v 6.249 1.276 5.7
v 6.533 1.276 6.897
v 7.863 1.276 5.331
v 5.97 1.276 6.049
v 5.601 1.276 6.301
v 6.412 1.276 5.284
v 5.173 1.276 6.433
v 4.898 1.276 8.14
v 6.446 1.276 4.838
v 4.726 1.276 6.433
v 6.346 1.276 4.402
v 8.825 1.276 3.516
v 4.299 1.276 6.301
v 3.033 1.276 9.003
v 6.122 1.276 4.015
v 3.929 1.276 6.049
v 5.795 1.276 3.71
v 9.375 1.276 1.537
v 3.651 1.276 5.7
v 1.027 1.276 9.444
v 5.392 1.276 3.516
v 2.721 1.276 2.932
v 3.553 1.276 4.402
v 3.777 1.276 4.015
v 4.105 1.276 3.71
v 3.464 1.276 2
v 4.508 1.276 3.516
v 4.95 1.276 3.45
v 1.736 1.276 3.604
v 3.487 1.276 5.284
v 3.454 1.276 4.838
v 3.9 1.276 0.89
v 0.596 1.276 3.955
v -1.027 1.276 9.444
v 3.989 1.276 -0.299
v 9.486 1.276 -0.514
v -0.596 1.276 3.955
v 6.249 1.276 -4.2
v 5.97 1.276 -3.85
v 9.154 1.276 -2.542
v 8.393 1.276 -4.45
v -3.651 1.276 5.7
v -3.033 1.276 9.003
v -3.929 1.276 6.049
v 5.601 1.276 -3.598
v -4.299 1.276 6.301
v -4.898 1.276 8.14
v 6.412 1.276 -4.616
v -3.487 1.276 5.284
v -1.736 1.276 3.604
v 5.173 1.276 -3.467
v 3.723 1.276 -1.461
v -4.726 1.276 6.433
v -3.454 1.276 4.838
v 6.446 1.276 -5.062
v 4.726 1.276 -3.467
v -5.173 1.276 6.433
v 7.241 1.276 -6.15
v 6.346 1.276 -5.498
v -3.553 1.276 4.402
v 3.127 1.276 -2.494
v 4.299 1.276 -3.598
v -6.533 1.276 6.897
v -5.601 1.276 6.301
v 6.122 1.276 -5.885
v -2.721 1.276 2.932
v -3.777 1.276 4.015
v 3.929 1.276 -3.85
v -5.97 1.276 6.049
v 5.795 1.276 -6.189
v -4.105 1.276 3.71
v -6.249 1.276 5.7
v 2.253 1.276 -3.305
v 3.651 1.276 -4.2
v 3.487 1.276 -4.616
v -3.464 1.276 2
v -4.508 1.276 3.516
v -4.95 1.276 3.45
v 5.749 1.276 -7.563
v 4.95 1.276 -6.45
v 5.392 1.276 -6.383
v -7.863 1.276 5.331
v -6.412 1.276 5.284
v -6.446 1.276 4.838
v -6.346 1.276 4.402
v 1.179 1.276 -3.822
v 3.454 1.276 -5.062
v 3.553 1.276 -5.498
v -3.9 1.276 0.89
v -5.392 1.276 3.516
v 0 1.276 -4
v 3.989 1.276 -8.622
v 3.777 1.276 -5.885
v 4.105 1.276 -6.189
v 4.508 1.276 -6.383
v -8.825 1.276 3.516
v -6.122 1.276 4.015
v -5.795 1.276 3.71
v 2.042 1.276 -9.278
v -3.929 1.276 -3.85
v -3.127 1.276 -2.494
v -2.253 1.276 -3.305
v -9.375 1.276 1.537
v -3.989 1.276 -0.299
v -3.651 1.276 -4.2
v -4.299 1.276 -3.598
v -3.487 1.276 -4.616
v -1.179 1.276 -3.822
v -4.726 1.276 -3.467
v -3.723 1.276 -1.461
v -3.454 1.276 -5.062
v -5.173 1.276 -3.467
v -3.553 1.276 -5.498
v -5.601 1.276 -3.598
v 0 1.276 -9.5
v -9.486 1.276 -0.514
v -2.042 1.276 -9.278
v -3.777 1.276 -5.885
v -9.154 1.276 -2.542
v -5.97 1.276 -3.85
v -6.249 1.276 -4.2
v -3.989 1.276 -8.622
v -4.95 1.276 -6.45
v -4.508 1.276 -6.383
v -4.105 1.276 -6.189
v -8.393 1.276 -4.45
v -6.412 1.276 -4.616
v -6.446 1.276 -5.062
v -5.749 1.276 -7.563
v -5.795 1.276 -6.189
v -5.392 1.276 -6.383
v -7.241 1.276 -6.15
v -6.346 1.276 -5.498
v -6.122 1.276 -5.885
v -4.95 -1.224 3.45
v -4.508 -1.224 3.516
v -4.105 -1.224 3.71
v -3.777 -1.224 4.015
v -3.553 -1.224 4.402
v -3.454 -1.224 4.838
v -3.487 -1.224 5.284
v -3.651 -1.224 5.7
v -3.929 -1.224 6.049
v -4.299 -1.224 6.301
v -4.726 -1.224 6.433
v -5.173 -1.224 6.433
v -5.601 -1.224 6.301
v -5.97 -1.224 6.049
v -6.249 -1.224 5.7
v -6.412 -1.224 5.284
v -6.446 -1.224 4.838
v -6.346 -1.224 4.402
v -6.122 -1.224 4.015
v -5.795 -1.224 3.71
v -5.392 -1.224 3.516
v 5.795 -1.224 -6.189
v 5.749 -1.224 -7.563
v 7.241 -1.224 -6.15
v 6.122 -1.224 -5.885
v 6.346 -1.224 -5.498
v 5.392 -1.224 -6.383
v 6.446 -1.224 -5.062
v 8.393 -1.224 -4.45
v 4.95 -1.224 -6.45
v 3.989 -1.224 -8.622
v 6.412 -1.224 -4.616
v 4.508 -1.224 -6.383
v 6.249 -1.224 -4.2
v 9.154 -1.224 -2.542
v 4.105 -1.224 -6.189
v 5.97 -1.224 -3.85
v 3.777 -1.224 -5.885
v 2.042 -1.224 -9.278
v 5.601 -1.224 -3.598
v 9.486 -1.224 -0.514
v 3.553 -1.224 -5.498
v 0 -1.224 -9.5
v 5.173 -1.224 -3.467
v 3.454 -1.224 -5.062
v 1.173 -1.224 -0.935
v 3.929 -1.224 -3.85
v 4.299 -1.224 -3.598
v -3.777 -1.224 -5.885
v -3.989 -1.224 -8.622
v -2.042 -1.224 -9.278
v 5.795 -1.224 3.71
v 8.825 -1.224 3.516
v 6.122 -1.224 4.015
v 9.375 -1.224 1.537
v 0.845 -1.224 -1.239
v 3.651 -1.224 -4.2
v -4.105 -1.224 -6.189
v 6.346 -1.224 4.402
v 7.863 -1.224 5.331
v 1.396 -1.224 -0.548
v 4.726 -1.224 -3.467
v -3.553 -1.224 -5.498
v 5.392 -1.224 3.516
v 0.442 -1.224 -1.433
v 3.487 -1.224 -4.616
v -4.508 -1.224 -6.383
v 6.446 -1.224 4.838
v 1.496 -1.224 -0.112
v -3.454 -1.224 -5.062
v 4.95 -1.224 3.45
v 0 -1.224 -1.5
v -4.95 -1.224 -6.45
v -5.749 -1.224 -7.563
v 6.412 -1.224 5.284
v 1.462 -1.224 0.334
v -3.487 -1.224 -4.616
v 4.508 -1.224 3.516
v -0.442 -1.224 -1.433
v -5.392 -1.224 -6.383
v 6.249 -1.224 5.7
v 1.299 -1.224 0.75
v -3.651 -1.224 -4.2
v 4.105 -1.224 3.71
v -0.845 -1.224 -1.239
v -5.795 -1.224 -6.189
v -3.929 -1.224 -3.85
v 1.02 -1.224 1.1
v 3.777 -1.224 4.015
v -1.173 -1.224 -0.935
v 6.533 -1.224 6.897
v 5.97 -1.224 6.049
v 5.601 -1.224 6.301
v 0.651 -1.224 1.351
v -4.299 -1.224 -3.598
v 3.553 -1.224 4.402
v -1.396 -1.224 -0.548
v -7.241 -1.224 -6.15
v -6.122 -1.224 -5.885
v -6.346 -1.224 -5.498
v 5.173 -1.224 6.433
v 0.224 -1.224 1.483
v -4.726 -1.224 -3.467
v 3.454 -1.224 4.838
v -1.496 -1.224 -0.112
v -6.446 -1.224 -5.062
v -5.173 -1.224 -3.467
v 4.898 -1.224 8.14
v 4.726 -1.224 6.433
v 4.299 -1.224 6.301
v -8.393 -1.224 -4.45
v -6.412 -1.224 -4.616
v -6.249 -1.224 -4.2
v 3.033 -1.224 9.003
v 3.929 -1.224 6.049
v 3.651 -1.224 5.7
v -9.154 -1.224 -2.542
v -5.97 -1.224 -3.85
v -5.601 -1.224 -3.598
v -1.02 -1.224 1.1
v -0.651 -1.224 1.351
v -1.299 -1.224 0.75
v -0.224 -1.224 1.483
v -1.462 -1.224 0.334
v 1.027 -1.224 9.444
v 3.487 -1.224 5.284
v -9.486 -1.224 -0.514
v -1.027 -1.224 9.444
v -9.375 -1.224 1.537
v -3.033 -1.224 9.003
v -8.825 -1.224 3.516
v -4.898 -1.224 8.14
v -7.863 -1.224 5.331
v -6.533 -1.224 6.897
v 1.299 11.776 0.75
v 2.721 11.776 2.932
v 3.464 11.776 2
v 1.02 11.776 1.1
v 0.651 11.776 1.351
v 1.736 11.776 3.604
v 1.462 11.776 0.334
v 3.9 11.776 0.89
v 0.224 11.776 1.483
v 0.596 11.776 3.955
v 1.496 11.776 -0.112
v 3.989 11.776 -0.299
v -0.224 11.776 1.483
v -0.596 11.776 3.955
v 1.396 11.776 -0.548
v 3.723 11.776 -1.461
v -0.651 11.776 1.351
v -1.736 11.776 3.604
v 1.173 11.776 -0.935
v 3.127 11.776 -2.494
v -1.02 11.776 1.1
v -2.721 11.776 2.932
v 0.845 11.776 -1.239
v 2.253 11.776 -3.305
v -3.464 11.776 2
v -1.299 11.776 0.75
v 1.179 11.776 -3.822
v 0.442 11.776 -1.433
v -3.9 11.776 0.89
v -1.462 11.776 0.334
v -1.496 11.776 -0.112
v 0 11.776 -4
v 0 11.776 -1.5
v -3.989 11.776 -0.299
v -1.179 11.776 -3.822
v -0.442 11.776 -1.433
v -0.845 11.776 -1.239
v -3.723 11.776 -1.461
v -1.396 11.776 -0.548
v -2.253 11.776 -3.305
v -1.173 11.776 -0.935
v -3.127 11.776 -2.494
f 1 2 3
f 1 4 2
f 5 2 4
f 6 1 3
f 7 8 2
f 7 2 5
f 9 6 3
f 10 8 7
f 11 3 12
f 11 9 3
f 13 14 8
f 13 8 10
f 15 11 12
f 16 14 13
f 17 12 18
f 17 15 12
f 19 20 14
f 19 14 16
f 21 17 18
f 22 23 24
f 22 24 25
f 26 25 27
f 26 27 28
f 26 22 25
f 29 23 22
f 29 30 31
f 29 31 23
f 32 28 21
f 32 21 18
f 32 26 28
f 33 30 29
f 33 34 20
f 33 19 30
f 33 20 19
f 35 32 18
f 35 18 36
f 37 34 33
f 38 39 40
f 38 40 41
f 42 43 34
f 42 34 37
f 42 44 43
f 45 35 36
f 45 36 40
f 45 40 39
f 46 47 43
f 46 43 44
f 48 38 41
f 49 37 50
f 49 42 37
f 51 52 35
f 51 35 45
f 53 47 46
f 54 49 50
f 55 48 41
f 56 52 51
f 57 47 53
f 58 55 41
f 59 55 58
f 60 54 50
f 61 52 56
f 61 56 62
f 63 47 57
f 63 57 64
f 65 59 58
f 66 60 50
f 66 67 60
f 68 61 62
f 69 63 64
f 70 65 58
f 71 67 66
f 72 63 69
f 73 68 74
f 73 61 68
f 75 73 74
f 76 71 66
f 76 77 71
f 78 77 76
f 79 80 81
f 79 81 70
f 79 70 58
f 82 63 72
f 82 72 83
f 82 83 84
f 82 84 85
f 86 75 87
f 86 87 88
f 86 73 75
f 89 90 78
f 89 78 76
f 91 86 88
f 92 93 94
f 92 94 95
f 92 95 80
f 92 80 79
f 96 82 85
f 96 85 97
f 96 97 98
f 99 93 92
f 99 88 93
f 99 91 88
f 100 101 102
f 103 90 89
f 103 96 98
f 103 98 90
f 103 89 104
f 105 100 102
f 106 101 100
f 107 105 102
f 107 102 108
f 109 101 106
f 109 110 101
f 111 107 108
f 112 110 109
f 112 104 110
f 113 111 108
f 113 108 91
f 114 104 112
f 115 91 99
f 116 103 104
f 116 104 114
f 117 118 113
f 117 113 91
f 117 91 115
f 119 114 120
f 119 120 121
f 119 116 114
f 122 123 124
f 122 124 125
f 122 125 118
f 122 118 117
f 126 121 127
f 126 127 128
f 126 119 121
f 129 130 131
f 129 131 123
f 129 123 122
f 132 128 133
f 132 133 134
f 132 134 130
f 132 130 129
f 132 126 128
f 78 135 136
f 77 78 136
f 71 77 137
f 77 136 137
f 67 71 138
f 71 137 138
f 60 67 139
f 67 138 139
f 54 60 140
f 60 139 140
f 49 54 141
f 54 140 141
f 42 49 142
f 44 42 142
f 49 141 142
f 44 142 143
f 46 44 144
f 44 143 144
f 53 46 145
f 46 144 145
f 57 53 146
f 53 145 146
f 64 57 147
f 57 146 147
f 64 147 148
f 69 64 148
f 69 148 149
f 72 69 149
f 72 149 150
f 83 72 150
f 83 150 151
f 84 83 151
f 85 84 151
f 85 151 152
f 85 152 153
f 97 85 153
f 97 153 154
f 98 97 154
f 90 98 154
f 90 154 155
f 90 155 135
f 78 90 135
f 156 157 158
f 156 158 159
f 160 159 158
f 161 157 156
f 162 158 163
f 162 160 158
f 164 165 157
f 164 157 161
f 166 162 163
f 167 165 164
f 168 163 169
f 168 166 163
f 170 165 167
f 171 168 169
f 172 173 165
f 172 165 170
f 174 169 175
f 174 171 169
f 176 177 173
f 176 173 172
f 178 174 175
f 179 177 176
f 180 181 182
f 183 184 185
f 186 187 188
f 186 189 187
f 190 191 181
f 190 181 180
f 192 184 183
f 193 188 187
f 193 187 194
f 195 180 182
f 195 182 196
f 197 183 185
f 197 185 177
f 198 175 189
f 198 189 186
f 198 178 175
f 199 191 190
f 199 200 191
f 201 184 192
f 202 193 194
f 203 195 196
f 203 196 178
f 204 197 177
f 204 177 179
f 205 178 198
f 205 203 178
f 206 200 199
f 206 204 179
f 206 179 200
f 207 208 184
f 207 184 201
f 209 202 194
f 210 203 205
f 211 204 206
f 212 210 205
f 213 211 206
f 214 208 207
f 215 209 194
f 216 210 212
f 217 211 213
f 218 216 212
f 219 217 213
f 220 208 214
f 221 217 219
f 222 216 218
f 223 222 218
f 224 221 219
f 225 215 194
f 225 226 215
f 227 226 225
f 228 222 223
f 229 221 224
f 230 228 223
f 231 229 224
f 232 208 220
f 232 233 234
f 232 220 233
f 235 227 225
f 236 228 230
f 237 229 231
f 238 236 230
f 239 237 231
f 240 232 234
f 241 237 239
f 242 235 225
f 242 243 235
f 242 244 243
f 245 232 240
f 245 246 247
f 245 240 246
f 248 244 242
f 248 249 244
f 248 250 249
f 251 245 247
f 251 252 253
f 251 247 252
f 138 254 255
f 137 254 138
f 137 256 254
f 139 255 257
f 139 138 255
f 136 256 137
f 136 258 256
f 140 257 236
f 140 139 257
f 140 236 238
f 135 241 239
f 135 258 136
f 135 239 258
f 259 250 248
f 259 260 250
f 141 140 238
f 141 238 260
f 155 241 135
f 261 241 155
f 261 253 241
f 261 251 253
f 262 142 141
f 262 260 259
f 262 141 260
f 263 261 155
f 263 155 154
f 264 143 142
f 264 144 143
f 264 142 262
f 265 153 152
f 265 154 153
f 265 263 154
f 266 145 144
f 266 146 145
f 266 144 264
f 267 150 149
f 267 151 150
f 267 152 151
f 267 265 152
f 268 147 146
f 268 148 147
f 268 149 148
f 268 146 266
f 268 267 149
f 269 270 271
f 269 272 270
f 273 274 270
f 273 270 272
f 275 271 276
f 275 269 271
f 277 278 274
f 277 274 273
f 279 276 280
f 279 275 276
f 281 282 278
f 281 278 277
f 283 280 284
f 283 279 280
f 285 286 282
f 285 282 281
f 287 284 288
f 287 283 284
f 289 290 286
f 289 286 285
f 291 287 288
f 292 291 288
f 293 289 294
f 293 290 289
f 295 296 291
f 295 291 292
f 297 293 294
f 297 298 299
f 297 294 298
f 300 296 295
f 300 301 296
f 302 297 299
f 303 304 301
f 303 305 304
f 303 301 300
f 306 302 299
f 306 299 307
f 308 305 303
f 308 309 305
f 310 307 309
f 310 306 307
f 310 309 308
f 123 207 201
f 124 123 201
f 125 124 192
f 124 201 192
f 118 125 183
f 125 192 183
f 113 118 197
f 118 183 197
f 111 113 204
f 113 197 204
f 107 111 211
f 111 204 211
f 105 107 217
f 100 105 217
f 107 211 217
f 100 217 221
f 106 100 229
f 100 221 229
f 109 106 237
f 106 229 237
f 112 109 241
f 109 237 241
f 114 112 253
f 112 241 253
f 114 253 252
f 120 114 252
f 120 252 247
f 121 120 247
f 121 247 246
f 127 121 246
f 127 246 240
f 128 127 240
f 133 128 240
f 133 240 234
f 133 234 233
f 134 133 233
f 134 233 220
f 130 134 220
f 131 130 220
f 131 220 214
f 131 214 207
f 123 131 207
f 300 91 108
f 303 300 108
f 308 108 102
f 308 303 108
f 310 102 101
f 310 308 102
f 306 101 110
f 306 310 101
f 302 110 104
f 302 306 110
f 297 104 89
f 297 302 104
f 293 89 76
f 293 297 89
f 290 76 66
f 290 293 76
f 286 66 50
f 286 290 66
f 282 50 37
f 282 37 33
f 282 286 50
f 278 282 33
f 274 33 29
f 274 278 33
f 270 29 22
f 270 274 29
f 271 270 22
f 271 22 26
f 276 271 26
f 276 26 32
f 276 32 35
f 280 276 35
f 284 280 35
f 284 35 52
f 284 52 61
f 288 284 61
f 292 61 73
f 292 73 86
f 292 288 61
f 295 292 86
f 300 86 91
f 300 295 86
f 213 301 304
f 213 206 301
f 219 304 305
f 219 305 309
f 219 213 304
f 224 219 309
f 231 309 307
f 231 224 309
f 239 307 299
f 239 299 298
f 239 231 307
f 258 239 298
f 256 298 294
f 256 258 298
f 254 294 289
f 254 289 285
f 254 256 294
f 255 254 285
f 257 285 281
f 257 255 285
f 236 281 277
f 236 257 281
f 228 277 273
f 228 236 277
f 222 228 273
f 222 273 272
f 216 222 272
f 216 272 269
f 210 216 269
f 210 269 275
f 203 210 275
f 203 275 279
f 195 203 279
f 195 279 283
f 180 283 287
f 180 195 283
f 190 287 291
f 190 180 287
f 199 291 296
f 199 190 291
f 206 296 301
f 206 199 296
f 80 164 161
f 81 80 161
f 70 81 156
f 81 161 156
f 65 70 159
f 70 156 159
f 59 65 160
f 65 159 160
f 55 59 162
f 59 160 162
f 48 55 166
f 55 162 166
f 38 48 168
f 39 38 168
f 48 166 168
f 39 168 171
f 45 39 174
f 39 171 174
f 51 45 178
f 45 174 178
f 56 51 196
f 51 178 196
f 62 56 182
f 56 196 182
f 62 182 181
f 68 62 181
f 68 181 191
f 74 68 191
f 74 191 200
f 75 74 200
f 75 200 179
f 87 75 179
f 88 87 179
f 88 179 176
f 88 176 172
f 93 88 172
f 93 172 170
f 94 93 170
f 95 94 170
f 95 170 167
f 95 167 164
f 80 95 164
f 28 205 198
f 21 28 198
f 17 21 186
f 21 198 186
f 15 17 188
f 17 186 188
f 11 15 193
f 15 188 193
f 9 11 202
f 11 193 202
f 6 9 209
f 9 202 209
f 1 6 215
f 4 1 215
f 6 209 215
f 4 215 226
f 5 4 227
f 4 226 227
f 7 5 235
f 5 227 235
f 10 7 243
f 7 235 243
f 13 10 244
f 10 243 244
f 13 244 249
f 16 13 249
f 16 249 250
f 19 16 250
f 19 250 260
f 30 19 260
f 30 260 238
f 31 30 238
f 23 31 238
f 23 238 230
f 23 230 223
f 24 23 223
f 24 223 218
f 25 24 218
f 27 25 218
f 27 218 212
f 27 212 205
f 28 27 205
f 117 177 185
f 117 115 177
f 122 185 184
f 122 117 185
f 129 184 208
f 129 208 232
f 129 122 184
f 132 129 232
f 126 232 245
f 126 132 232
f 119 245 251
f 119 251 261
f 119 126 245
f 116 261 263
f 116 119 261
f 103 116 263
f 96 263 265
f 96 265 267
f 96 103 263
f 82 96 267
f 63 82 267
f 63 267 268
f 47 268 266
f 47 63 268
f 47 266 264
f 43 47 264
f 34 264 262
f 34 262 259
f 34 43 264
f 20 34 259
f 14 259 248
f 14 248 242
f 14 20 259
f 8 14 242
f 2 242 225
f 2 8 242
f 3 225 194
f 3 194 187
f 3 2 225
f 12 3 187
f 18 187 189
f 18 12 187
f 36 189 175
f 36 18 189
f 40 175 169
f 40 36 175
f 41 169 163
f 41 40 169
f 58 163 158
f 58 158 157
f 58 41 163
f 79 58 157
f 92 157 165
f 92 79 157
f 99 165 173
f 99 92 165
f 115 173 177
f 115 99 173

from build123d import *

# Parameters (mm, degrees)
SKETCH2_R          = 1.5
CUT_EXTRUDE1_DEPTH = 31


with BuildPart() as part:
    # Sketch1 → Revolve1 (revolve)
    with BuildSketch(Plane.XY, mode=Mode.PRIVATE) as revolve1_sk:
        Polygon((-1.5, -1.224136042), (-9.5, -1.224136042), (-9.5, 1.275863958), (-4, 1.275863958), (-4, 11.775863958), (-1.5, 11.775863958), align=None)
    revolve(revolve1_sk.sketch.rotate(Axis((0, -0.965665236, 0), (0, 1, 0)), 270), axis=Axis((0, -0.965665236, 0), (0, 1, 0)))

    # Sketch2 → Cut-Extrude1 (cut)
    with BuildSketch(Plane.XZ.offset(1.224136042)):
        with Locations(Location((-4.949747468, 4.949747468, 0), (0, 0, 270))):
            Circle(SKETCH2_R)
        with Locations(Location((4.949747468, 4.949747468, 0), (0, 0, 270))):
            Circle(SKETCH2_R)
        with Locations(Location((4.949747468, -4.949747468, 0), (0, 0, 270))):
            Circle(SKETCH2_R)
        with Locations(Location((-4.949747468, -4.949747468, 0), (0, 0, 270))):
            Circle(SKETCH2_R)
    extrude(amount=-CUT_EXTRUDE1_DEPTH, mode=Mode.SUBTRACT)


solid = part.part
